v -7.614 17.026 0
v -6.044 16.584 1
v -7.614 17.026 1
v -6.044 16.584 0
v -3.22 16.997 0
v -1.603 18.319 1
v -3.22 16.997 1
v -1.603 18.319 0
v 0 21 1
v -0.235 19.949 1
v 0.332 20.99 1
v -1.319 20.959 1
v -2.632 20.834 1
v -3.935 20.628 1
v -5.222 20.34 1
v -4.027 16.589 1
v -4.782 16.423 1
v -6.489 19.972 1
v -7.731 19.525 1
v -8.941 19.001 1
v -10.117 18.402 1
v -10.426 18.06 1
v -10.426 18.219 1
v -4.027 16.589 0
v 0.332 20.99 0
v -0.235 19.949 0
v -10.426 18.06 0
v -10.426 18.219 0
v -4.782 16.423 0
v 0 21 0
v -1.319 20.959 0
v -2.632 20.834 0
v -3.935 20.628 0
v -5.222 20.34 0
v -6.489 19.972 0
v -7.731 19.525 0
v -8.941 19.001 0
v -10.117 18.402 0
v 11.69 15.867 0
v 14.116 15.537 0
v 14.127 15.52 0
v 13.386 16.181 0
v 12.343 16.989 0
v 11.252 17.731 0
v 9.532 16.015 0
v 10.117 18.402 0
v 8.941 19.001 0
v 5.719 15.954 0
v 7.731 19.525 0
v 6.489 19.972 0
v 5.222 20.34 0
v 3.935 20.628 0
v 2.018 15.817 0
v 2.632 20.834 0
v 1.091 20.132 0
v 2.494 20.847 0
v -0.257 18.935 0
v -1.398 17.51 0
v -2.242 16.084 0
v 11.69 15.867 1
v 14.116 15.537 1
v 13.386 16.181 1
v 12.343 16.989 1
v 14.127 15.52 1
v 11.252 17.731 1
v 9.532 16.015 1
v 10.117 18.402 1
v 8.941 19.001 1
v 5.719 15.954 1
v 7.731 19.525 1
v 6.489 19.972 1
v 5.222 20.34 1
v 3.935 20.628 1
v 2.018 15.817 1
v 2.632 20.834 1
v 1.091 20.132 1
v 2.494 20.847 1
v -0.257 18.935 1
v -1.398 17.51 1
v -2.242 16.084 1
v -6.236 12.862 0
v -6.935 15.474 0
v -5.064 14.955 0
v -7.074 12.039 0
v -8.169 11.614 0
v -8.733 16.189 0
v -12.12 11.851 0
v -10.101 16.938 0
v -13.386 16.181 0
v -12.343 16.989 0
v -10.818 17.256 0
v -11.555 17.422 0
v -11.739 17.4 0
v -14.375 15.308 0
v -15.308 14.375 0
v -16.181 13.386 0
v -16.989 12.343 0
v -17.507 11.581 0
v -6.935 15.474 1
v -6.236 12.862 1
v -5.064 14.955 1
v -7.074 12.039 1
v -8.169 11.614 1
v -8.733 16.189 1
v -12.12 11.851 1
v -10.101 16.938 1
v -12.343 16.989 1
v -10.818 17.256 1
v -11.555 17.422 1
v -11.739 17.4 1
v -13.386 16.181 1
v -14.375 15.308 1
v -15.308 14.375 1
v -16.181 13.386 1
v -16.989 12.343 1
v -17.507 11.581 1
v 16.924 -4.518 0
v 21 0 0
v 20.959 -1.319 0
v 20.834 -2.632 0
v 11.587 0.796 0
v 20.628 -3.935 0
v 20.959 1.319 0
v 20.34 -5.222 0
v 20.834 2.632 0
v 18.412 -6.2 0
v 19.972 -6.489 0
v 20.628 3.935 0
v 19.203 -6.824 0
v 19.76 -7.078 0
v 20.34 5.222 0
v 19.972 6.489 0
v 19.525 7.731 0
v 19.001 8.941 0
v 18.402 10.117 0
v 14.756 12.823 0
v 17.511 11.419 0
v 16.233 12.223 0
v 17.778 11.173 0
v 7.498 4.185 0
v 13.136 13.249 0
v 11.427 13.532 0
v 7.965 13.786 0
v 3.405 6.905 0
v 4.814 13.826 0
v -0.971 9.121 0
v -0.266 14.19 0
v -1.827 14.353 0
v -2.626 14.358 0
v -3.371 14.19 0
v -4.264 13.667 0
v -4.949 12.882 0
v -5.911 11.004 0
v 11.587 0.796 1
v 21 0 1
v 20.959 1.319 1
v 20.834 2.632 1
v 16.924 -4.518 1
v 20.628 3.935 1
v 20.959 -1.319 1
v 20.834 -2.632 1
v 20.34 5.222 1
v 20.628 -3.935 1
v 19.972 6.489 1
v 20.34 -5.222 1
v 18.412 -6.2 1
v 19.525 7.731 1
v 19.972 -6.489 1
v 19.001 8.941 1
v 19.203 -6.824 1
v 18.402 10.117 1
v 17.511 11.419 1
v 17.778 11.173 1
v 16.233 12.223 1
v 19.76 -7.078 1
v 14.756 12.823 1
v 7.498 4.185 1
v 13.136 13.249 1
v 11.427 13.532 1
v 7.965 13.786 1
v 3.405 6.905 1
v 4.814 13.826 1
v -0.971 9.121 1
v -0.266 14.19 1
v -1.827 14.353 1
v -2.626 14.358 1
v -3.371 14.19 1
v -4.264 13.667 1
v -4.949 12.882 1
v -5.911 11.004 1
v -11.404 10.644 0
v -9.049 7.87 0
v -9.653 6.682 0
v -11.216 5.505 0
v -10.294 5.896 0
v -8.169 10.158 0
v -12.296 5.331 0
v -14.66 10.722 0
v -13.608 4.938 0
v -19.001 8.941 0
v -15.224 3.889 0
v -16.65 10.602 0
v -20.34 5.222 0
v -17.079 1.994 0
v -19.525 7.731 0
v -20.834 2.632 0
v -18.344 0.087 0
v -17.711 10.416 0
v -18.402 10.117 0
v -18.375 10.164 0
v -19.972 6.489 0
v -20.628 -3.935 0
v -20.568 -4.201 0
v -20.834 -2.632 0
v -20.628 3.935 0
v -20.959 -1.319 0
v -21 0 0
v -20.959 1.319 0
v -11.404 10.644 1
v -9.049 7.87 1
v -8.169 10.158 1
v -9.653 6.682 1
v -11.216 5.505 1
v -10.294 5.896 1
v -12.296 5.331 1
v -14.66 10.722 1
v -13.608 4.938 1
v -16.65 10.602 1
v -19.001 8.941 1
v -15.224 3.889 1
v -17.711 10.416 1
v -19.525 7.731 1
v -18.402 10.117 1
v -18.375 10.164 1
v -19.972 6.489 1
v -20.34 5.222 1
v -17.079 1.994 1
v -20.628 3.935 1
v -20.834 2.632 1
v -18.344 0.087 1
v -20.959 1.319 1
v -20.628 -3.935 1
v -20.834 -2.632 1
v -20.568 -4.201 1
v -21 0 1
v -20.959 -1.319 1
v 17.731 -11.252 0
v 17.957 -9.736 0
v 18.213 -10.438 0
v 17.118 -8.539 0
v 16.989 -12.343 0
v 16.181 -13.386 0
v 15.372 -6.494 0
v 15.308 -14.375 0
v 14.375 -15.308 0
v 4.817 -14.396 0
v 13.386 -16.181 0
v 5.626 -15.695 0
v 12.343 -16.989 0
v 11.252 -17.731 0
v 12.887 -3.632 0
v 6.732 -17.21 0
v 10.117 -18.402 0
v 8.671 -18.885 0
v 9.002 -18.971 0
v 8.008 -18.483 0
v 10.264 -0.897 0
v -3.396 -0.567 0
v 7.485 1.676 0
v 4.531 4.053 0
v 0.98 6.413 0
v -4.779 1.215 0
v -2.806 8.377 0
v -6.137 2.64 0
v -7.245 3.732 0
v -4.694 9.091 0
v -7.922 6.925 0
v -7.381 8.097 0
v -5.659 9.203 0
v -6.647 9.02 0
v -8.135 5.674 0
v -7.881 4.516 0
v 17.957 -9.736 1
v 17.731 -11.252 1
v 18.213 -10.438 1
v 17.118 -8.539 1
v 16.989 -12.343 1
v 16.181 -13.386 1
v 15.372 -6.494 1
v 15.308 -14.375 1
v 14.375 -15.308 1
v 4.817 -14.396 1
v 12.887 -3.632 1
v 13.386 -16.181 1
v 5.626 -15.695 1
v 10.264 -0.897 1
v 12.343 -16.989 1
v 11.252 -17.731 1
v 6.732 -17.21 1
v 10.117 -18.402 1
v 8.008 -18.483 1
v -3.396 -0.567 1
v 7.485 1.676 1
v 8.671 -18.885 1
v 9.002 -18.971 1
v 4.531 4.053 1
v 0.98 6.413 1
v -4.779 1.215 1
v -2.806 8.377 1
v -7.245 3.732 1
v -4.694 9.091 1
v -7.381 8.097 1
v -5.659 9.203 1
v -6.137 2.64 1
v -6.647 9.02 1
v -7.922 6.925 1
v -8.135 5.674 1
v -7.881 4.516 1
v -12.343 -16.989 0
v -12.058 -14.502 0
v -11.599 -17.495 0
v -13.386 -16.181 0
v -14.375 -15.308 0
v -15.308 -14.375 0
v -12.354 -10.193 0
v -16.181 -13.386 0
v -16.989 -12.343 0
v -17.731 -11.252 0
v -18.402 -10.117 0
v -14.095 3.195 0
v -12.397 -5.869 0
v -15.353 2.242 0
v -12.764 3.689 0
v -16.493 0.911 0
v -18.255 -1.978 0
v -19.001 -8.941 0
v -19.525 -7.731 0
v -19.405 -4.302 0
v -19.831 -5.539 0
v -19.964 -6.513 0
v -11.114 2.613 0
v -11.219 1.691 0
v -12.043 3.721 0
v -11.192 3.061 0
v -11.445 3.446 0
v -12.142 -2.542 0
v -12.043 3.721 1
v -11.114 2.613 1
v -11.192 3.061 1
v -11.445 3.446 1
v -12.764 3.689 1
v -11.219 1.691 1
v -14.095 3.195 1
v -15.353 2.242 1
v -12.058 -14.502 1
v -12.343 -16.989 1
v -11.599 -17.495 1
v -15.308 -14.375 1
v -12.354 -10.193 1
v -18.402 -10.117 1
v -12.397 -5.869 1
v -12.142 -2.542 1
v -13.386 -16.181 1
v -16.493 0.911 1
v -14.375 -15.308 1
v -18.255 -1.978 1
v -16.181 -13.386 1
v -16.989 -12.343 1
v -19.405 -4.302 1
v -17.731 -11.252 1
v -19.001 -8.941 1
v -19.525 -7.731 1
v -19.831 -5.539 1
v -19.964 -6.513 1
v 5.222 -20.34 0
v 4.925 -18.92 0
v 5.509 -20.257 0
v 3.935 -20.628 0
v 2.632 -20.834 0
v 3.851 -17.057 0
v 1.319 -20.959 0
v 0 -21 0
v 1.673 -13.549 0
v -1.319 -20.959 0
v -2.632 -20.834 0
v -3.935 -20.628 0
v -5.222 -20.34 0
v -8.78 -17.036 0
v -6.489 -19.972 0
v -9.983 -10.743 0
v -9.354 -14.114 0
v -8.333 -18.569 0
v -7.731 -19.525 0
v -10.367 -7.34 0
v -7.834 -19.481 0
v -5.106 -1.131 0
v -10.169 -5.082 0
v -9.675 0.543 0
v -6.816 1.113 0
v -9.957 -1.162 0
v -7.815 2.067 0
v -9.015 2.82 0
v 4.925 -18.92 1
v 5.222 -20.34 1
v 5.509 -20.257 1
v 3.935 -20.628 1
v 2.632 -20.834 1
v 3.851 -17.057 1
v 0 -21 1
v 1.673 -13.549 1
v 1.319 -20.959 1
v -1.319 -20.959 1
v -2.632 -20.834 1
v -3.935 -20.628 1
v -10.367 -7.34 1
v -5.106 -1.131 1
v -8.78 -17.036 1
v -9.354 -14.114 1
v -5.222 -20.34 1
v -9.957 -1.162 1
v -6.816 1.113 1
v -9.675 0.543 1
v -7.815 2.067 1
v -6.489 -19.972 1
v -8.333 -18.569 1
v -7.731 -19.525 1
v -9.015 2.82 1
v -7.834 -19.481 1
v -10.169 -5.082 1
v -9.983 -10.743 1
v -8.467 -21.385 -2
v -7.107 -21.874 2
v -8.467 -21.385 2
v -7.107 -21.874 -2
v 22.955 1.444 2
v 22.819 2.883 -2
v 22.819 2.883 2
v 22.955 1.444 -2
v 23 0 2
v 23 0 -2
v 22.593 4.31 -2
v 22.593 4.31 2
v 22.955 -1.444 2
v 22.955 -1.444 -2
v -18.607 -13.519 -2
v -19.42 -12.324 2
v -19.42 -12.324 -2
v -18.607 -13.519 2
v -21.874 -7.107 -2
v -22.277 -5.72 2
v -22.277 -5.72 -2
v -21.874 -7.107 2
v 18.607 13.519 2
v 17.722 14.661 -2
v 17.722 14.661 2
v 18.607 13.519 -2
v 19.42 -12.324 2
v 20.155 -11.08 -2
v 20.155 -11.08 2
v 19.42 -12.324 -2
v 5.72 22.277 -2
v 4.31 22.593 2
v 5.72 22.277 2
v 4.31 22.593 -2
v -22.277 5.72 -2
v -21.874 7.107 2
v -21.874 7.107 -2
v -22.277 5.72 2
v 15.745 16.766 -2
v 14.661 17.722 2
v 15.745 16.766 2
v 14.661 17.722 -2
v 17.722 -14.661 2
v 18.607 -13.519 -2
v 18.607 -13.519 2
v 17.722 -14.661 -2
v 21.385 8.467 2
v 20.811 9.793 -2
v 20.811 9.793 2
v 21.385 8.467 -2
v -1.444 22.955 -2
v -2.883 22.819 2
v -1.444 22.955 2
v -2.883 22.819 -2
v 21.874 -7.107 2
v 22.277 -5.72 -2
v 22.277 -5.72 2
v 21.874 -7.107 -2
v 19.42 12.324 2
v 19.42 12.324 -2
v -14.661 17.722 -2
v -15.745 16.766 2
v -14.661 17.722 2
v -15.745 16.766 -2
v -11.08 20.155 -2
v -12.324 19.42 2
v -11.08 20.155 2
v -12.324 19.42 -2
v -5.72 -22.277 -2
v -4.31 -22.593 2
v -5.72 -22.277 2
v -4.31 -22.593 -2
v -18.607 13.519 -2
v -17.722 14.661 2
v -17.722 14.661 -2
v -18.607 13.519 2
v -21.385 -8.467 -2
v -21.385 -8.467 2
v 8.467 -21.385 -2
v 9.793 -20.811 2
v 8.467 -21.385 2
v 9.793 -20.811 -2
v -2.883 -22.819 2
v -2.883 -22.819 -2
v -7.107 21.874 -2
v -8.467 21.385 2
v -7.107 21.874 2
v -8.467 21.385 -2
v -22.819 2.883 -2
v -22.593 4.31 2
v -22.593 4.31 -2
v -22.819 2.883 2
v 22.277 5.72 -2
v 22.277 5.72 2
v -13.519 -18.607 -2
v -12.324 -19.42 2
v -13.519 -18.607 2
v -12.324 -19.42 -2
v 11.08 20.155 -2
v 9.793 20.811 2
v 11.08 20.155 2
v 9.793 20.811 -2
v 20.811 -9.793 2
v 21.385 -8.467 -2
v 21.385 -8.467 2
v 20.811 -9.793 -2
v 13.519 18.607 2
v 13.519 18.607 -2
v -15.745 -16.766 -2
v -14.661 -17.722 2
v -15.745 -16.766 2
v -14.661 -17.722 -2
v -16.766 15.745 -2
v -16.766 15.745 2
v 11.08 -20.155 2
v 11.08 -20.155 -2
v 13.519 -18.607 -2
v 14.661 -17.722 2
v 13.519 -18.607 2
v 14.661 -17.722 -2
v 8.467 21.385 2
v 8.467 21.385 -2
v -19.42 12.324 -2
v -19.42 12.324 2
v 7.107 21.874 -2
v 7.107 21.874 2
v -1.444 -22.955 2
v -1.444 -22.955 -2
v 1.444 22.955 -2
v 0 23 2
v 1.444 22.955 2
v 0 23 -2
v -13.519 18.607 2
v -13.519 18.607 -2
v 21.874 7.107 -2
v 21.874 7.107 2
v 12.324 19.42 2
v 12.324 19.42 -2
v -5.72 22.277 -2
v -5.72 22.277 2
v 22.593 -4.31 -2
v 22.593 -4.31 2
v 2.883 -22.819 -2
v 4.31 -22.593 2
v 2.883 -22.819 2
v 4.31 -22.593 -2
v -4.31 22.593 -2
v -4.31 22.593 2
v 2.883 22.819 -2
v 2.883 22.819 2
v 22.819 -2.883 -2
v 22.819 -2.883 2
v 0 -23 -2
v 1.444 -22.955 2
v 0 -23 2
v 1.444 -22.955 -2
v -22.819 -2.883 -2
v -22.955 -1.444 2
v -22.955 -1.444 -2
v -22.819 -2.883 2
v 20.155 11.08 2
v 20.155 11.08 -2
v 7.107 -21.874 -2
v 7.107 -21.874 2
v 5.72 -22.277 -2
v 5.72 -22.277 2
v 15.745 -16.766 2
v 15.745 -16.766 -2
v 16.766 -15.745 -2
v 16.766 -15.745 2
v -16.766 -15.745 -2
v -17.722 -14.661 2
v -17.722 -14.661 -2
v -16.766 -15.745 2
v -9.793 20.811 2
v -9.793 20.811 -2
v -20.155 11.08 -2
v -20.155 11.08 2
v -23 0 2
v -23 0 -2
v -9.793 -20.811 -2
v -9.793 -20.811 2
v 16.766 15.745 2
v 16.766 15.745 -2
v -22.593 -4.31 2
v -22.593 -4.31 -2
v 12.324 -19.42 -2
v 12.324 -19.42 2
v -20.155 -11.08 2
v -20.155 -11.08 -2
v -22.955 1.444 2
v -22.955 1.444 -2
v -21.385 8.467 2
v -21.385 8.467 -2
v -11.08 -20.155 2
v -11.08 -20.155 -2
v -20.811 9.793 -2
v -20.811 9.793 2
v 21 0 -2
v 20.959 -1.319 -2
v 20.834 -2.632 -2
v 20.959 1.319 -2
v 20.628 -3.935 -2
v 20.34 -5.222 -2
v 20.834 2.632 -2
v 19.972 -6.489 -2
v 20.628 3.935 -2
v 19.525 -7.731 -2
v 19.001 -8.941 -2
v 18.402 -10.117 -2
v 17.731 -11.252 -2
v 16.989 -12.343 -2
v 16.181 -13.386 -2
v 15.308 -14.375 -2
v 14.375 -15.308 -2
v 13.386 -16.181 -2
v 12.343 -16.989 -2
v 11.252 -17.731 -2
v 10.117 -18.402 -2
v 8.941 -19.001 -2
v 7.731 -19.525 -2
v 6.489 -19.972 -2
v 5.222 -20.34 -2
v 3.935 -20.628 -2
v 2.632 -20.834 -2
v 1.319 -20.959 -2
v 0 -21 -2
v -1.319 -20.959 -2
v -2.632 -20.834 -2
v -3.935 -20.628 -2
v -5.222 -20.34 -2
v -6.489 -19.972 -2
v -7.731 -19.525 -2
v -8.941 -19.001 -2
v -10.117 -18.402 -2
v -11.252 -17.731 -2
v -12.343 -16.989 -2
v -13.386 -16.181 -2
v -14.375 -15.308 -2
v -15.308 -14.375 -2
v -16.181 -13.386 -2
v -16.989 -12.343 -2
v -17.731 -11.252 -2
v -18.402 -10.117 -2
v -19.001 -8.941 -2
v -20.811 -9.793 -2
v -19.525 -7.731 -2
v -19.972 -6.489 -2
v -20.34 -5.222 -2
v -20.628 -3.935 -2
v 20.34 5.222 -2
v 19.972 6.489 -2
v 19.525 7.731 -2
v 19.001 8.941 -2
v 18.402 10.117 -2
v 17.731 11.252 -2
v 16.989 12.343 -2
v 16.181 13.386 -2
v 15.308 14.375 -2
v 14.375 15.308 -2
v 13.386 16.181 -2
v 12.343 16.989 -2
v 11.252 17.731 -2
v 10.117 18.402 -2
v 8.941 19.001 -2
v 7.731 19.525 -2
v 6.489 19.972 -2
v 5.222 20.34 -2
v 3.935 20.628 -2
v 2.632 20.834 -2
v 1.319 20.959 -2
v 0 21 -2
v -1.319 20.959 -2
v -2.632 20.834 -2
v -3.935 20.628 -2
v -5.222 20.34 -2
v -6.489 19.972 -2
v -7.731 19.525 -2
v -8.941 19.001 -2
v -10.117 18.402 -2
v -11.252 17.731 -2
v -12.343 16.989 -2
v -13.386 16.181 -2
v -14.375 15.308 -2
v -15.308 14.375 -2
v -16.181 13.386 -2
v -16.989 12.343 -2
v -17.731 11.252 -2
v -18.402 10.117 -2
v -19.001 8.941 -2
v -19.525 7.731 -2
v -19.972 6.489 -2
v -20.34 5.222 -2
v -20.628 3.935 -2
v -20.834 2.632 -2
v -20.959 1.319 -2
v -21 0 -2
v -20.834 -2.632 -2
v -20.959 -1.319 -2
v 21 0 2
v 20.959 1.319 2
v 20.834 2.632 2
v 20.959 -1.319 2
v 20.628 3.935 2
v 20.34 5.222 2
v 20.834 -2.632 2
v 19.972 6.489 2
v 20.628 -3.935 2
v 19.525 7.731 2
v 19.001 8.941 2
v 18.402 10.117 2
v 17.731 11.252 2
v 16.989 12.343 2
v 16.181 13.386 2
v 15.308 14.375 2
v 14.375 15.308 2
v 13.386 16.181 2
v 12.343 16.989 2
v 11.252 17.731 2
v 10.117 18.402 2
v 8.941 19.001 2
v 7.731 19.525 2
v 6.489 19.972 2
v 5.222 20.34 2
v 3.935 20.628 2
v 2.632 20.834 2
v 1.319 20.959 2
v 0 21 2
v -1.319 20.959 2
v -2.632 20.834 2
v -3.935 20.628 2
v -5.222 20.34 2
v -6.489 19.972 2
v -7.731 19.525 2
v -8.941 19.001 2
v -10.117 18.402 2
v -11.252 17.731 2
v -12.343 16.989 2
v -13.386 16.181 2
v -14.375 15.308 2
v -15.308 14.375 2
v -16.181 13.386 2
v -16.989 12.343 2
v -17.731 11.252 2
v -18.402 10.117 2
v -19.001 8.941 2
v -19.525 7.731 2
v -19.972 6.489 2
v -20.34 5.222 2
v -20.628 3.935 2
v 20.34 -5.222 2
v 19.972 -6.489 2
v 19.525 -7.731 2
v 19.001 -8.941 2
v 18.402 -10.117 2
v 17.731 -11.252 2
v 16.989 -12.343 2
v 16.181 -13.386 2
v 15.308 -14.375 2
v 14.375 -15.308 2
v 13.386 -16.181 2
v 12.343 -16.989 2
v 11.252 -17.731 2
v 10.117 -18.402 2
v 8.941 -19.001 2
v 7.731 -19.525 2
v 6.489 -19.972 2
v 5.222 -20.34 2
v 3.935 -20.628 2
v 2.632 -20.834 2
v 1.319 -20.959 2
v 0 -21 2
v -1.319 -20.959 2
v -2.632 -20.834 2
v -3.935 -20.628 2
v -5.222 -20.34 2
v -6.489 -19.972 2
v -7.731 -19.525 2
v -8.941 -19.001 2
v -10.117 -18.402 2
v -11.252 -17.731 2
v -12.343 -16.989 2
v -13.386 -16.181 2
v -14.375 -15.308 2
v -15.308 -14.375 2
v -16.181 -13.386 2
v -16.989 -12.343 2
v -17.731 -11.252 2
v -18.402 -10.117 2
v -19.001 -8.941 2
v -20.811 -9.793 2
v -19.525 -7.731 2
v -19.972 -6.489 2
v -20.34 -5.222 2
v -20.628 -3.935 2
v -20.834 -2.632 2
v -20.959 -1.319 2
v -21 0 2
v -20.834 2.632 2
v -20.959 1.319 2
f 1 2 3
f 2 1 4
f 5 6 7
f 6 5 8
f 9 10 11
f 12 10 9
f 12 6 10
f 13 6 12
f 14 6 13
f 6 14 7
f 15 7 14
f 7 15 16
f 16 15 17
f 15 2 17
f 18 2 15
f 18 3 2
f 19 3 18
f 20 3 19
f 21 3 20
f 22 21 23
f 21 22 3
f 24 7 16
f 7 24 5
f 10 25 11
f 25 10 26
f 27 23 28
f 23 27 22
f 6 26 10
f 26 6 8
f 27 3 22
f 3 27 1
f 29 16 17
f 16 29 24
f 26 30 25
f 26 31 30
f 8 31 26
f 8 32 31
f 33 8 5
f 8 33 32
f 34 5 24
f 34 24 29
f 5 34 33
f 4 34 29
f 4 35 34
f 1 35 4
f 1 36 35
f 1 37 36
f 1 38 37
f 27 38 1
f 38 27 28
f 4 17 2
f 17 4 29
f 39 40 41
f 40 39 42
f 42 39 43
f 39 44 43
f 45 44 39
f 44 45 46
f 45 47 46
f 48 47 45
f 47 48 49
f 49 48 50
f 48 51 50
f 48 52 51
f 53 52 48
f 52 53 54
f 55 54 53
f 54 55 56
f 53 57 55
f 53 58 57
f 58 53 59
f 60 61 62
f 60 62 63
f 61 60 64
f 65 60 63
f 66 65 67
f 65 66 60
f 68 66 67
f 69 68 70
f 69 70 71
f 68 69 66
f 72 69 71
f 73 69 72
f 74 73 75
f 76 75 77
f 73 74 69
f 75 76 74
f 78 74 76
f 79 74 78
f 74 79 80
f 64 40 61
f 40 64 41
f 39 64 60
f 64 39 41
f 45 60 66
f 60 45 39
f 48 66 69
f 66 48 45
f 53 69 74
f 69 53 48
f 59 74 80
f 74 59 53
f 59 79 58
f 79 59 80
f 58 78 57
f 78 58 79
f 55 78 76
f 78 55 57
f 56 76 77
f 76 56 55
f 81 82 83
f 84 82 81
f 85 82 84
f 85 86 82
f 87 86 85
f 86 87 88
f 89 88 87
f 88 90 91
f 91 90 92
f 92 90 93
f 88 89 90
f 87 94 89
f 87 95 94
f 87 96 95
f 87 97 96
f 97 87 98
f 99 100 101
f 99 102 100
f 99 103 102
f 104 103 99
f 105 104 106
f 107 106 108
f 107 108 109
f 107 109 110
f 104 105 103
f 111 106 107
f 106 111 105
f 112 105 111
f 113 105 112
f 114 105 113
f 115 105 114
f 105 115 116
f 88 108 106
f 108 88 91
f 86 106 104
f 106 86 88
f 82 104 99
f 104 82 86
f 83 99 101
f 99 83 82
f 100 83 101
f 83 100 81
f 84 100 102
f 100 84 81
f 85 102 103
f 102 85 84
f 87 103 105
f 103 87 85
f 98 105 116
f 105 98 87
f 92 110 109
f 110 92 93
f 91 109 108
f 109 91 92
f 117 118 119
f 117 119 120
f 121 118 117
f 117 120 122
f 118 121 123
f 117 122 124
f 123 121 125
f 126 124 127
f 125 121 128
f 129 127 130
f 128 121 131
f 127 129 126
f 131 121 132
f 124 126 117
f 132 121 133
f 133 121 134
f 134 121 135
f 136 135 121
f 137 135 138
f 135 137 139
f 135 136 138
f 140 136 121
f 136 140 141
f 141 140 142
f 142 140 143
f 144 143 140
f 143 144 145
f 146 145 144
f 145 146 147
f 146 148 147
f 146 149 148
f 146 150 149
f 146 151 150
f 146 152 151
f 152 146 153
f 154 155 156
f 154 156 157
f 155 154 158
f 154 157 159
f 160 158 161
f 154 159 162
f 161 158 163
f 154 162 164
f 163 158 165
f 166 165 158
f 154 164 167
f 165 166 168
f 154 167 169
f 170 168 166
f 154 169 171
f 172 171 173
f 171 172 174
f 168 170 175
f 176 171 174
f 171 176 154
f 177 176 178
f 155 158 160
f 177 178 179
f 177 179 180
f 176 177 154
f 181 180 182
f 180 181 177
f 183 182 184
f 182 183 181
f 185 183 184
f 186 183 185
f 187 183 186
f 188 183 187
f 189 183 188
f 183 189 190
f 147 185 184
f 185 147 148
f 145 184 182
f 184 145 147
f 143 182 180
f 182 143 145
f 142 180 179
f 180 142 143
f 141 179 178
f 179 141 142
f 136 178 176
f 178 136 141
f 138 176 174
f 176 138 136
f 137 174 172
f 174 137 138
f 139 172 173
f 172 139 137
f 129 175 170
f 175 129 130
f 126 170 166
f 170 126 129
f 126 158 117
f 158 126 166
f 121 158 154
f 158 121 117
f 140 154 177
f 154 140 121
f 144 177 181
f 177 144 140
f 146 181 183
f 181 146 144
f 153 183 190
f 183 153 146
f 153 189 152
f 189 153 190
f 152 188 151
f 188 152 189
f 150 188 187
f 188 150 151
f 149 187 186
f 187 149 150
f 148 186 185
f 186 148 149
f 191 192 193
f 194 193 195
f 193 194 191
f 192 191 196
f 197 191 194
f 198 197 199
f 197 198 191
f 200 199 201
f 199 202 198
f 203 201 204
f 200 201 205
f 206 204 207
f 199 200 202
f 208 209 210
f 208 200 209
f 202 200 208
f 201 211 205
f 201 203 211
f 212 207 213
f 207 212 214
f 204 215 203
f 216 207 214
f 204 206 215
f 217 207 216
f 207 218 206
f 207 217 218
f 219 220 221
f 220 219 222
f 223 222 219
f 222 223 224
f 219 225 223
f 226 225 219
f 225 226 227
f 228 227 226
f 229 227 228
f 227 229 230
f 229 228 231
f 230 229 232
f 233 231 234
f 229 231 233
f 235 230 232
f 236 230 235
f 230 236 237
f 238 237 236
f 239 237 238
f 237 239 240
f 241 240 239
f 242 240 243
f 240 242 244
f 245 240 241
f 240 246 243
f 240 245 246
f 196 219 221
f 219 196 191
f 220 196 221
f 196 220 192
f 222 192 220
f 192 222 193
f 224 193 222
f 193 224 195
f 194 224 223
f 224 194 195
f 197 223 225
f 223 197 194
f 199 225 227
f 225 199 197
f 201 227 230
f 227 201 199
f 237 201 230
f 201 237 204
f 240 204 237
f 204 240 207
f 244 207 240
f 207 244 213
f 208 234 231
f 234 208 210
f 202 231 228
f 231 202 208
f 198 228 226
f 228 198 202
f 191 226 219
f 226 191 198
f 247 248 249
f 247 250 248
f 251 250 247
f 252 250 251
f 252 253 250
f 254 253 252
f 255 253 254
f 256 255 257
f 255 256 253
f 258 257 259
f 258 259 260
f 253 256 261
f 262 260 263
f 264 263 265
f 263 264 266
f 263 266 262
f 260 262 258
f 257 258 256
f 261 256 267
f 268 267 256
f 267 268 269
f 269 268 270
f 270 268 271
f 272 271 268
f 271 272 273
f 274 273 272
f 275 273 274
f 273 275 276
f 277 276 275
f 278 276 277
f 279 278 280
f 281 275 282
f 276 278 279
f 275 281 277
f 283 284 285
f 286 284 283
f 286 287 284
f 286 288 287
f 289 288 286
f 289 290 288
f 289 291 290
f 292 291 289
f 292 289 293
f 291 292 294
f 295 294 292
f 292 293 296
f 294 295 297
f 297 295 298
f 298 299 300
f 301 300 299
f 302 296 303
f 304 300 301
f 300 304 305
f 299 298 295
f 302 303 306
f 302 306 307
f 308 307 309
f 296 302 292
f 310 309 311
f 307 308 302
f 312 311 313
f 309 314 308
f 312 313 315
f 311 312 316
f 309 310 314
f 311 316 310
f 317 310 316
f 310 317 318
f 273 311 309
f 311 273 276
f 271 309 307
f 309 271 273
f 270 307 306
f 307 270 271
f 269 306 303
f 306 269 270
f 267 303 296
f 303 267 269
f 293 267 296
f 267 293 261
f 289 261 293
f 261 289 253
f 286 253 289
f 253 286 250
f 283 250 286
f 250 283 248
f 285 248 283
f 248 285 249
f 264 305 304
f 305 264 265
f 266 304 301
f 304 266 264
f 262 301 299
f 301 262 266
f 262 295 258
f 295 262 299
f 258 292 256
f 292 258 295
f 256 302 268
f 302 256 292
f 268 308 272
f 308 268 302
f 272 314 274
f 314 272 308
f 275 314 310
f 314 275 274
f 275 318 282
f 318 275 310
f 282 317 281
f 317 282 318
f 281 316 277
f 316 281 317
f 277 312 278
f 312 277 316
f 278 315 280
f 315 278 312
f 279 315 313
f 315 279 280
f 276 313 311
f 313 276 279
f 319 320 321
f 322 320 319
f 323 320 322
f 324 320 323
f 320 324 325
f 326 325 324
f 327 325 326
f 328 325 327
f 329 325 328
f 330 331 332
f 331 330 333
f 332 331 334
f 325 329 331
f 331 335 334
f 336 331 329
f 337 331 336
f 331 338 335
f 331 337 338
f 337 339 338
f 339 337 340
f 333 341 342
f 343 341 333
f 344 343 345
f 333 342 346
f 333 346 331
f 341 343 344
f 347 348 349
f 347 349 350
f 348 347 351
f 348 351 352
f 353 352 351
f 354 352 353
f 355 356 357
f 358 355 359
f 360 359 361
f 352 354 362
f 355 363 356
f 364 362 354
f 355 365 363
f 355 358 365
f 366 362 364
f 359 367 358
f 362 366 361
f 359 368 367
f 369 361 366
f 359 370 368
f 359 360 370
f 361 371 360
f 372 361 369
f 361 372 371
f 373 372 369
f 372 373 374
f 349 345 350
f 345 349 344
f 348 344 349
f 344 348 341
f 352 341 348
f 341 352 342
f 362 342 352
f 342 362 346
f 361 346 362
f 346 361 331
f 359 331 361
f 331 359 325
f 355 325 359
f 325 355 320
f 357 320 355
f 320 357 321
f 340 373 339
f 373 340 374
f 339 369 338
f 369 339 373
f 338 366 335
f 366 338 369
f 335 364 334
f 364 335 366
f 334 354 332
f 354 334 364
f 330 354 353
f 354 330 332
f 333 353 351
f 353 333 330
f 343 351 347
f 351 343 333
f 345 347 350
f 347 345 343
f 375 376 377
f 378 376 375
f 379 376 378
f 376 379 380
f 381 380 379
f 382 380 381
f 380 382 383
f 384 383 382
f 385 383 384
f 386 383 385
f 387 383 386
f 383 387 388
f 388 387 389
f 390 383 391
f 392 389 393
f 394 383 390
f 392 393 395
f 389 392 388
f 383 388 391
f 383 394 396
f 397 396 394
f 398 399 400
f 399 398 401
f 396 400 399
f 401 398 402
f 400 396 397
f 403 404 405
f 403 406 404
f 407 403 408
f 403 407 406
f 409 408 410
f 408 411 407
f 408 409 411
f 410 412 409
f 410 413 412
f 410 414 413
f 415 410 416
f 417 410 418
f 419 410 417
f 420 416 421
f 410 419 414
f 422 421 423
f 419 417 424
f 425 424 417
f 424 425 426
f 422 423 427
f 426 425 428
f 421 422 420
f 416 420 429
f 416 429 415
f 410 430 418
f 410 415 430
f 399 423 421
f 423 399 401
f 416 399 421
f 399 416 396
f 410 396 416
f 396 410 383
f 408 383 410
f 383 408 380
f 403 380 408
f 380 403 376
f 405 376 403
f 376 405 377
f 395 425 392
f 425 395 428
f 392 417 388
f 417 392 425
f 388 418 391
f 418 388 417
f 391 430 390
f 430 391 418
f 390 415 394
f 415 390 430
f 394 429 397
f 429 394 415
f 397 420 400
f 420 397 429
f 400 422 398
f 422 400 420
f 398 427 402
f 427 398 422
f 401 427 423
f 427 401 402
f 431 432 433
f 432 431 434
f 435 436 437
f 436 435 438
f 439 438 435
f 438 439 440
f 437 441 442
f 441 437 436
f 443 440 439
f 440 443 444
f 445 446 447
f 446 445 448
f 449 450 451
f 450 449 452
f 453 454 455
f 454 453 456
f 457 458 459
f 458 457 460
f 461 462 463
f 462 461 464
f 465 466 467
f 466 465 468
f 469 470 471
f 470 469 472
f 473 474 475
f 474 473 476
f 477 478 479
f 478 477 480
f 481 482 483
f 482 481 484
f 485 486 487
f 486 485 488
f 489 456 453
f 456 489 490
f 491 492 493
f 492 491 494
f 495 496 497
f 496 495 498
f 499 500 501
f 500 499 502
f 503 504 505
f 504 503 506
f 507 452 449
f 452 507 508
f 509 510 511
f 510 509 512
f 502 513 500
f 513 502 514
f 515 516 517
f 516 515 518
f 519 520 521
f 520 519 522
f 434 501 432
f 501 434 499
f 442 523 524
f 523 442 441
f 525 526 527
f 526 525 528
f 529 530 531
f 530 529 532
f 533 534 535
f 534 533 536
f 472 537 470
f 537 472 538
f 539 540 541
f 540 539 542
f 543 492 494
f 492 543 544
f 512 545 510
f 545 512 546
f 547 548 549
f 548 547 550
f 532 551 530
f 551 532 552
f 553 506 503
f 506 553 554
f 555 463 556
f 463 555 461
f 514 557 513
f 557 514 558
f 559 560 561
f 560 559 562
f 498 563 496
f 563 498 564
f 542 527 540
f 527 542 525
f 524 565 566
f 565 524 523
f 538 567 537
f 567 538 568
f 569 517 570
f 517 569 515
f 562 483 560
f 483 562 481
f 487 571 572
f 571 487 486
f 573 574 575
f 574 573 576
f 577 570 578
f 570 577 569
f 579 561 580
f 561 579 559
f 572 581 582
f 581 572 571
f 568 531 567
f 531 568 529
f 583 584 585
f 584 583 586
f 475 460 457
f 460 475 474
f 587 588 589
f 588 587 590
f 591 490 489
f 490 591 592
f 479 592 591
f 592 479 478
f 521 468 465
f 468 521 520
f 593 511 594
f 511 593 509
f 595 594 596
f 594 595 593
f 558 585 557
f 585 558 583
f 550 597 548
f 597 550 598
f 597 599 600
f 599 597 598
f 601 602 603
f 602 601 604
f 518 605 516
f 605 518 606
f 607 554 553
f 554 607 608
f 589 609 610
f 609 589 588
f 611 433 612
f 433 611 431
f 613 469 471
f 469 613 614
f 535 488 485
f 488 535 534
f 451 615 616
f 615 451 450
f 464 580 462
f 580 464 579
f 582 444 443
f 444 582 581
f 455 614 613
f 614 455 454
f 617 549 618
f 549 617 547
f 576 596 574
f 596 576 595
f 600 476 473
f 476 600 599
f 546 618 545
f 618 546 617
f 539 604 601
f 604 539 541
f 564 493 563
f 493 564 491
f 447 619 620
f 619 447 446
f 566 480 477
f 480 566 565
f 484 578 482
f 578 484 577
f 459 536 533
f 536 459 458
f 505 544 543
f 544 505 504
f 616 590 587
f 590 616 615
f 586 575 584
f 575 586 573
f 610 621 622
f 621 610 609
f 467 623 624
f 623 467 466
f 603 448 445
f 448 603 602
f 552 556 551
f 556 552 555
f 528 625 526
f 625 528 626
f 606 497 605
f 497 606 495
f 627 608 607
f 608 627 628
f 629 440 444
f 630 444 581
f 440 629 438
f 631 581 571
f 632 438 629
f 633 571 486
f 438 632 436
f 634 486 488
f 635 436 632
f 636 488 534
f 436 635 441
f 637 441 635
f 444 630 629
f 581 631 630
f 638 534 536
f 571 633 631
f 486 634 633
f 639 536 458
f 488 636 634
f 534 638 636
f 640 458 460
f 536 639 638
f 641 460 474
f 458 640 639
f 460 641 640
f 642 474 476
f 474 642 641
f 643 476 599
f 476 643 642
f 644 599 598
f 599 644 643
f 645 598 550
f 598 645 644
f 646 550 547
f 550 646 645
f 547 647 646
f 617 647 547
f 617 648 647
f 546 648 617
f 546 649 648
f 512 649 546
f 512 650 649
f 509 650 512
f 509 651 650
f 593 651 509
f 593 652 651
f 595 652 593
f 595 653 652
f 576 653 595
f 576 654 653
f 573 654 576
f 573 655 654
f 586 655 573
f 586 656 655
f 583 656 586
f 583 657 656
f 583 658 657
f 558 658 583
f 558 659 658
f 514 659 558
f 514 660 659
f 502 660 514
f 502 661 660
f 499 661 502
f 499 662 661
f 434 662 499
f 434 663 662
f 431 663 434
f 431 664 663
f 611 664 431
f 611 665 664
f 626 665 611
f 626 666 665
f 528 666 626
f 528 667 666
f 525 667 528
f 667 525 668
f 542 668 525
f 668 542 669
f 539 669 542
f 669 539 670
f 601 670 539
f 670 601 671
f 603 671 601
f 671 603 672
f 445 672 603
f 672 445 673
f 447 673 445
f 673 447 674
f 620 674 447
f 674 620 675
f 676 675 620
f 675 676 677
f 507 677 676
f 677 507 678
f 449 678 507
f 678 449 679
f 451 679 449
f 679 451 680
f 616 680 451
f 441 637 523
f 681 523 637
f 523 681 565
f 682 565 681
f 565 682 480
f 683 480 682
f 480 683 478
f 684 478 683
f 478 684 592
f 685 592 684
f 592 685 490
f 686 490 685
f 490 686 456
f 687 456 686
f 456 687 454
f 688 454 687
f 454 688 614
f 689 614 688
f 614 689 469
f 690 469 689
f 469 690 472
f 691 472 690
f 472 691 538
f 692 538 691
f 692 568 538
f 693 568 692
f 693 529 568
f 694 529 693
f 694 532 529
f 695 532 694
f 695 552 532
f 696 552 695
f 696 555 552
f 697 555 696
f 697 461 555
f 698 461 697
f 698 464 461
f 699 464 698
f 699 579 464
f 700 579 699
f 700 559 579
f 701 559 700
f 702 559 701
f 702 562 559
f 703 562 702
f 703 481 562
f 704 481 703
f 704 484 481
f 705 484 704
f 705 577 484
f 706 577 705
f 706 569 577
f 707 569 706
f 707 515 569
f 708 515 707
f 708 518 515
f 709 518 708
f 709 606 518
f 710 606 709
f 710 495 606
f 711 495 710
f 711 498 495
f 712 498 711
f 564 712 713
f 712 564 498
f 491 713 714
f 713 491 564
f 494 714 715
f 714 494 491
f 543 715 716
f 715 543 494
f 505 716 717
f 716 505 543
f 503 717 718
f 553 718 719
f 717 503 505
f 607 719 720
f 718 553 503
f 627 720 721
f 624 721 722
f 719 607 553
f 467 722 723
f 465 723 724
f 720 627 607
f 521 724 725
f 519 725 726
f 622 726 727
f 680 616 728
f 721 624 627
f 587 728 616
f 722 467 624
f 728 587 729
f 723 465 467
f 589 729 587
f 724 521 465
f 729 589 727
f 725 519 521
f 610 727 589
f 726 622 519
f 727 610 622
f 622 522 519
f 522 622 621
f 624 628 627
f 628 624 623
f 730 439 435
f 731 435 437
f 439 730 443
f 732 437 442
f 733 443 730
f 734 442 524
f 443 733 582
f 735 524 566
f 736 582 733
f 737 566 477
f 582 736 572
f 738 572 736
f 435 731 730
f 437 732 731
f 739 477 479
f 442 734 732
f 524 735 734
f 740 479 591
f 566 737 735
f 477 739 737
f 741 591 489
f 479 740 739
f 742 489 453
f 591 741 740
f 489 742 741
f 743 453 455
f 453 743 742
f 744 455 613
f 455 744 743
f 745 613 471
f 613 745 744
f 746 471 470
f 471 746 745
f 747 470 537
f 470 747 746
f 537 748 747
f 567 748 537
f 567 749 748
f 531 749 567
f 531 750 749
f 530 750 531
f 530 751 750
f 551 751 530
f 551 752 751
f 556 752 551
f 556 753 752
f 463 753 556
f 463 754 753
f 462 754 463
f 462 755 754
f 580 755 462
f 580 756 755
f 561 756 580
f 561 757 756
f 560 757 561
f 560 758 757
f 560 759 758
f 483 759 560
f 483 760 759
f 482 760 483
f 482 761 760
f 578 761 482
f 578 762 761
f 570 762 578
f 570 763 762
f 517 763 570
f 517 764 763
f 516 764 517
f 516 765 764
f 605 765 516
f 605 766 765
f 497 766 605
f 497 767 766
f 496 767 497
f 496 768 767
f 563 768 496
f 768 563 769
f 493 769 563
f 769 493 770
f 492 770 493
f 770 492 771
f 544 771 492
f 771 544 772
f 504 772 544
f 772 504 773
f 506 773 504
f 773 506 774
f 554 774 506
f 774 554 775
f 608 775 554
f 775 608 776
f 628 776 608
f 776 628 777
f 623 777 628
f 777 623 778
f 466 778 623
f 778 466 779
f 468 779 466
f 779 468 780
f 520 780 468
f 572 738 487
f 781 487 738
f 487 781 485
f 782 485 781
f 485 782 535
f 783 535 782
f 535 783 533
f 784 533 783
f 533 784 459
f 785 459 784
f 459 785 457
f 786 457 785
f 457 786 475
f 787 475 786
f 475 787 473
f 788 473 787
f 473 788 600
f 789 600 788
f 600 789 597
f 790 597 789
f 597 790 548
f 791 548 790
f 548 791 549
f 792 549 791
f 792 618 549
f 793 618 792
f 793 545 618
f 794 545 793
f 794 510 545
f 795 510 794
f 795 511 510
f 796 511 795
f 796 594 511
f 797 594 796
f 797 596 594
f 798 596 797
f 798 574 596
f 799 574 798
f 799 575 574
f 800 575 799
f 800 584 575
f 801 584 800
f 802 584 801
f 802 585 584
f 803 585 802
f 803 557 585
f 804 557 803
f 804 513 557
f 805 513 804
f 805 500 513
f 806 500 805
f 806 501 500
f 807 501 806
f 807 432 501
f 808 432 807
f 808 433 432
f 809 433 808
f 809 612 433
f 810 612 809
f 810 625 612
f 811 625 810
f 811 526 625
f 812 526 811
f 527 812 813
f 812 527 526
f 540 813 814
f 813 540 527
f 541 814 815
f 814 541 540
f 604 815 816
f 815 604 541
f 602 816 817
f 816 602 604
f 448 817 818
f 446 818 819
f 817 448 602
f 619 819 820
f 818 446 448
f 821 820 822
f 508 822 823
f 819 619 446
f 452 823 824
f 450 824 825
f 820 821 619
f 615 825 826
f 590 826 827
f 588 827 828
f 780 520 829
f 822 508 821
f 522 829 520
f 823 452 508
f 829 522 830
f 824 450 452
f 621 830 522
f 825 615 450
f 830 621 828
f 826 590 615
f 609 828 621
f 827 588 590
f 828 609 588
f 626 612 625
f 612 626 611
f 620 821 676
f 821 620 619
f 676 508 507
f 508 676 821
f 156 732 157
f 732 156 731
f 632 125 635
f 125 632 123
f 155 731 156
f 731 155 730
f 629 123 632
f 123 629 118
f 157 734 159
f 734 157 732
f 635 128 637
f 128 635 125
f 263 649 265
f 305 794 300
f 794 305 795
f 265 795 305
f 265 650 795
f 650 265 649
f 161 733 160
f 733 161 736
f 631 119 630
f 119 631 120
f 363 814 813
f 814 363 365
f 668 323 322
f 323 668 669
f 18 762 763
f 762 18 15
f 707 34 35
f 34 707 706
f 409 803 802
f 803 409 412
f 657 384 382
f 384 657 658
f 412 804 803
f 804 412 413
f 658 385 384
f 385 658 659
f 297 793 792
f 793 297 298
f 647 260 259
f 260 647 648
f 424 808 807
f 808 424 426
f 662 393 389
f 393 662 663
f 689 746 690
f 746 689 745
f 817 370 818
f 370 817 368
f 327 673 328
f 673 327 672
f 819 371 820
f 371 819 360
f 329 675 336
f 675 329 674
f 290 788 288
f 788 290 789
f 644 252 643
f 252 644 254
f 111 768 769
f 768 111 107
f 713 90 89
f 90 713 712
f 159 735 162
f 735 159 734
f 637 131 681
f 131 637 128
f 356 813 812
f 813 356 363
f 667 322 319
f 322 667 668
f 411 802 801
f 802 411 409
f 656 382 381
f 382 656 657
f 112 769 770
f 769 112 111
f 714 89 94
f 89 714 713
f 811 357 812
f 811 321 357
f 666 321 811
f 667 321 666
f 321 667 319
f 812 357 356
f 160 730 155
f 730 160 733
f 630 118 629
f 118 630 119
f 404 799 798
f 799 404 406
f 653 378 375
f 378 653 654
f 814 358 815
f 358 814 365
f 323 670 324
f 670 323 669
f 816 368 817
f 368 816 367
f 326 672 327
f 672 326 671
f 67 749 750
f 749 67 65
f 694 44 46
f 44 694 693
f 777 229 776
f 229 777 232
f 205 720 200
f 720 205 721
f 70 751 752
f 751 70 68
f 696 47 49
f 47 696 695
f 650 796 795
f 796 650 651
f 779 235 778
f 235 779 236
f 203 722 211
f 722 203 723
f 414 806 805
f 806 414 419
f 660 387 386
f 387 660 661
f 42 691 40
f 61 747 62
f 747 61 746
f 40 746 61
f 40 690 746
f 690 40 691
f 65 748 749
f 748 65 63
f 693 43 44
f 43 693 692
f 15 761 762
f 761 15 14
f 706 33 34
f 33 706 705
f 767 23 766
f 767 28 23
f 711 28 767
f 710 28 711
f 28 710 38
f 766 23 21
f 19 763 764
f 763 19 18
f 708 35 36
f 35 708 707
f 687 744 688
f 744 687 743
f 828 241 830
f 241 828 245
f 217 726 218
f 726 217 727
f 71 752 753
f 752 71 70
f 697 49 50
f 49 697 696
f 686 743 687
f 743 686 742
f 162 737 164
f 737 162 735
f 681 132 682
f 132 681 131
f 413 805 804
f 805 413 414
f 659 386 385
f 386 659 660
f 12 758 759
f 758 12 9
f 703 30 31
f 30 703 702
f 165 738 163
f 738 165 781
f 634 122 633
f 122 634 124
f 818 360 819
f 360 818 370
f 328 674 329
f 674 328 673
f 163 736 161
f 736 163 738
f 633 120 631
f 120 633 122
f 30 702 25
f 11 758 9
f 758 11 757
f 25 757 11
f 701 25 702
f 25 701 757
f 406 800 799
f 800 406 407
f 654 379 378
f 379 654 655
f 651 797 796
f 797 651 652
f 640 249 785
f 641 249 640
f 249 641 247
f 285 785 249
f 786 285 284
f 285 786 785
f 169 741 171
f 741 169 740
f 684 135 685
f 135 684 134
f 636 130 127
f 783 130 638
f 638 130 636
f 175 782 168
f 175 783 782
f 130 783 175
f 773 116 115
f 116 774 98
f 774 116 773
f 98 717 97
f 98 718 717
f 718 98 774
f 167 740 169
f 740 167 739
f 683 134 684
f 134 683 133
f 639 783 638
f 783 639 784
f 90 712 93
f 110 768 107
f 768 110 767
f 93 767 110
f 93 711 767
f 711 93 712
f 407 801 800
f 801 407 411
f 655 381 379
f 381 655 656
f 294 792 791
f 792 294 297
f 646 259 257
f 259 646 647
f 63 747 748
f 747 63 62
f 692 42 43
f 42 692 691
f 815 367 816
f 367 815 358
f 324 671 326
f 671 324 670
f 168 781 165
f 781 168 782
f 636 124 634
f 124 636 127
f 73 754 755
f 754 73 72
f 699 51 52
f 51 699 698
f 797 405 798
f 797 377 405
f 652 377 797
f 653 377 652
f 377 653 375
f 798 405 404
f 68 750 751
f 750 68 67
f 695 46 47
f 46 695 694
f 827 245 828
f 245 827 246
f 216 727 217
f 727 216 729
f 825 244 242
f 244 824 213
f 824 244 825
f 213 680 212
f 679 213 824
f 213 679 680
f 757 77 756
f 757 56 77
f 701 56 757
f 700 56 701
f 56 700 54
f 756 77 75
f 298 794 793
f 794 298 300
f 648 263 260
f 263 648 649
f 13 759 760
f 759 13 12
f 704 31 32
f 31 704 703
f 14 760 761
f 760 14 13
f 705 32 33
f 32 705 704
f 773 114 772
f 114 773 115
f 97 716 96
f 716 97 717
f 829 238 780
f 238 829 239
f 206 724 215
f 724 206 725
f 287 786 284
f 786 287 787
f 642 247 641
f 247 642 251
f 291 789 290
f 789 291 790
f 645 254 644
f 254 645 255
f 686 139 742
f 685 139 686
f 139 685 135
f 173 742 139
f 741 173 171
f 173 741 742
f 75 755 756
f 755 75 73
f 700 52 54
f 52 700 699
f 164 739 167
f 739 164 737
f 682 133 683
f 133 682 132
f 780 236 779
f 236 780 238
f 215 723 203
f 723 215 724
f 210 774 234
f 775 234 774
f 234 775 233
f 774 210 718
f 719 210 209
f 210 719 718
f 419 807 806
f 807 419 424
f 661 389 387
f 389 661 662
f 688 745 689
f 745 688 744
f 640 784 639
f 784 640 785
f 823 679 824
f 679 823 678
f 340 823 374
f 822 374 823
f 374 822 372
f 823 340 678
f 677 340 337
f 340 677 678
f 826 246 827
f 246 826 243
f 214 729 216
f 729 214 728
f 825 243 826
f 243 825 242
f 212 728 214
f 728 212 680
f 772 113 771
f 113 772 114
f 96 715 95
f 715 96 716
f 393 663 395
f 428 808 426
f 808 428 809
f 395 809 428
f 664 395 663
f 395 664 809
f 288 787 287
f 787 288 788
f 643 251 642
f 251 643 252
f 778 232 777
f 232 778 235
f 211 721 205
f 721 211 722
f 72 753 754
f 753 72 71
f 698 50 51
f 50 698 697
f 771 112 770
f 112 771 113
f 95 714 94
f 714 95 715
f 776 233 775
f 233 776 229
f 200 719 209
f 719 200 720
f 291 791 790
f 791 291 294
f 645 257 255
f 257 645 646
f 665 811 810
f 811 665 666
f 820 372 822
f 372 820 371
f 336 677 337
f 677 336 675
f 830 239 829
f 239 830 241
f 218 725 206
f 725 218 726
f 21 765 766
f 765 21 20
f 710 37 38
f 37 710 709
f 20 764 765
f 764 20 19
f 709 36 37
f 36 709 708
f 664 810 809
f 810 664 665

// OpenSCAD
// Module names are of the form poly_<inkscape-path-id>().  As a result,
// you can associate a polygon in this OpenSCAD program with the corresponding
// SVG element in the Inkscape document by looking for the XML element with
// the attribute id="inkscape-path-id".

// fudge value is used to ensure that subtracted solids are a tad taller
// in the z dimension than the polygon being subtracted from.  This helps
// keep the resulting .stl file manifold.
fudge = 0.1;

module poly_innerballSelection(h)
{
  scale([25.4/90, -25.4/90, 1]) union()
  {
    linear_extrude(height=h)
      polygon([[2.056387,-75.991250],[-0.833613,-70.684375],[-5.681113,-64.908750],[-11.409863,-60.224375],[-14.268379,-58.778906],[-16.943613,-58.191250],[-21.417207,-58.761406],[-26.977363,-60.330000],[-36.943613,-63.991250],[-36.943613,-66.991250],[-27.065645,-70.951250],[-17.987363,-73.726250],[-8.637207,-75.383750],[2.056387,-75.991250]]);
    linear_extrude(height=h)
      polygon([[9.056387,-73.981250],[12.045137,-74.477969],[15.078887,-74.347500],[21.056387,-73.101250],[29.101855,-70.565469],[37.555137,-66.682500],[45.009043,-61.481406],[47.921484,-58.395645],[50.056387,-54.991250],[41.421289,-56.221523],[33.775605,-56.746562],[20.265137,-56.531250],[7.150293,-56.045937],[-7.943613,-56.991250],[-4.954082,-62.045000],[-0.909863,-67.091250],[3.867480,-71.335000],[9.056387,-73.981250]]);
    linear_extrude(height=h)
      polygon([[-40.943613,-61.731250],[-38.330645,-61.142656],[-35.789863,-60.015000],[-30.943613,-57.361250],[-24.571113,-54.827500],[-17.943613,-52.991250],[-22.097363,-45.575000],[-25.066270,-42.656719],[-28.943613,-41.151250],[-42.943613,-41.991250],[-62.943613,-40.991250],[-59.438613,-47.356562],[-54.096113,-54.316250],[-50.973691,-57.371523],[-47.677363,-59.798437],[-44.302285,-61.338008],[-40.943613,-61.731250]]);
    linear_extrude(height=h)
      polygon([[-11.943613,-50.281250],[-9.305176,-50.874687],[-6.473613,-50.858750],[-0.943613,-50.281250],[17.056387,-48.991250],[28.223262,-48.849531],[40.488887,-47.947500],[46.543887,-46.945645],[52.285762,-45.434844],[57.518574,-43.308809],[62.046387,-40.461250],[65.088638,-37.658560],[67.701895,-34.440352],[71.732949,-26.959062],[74.322598,-18.420742],[75.653887,-9.228750],[75.909863,0.213555],[75.273574,9.502813],[73.928066,18.235664],[72.056387,26.008750],[68.041074,24.179063],[65.238887,21.968750],[59.966387,16.008750],[41.056387,-2.821250],[26.567949,-14.830469],[12.066387,-24.465000],[-3.440176,-32.320156],[-20.943613,-38.991250],[-17.534863,-45.645000],[-15.109082,-48.425781],[-11.943613,-50.281250]]);
    linear_extrude(height=h)
      polygon([[-72.193613,-23.991250],[-69.698613,-30.487500],[-67.859551,-33.617031],[-65.613613,-35.821250],[-62.754863,-36.908437],[-58.996113,-37.566250],[-51.943613,-37.991250],[-40.406113,-37.715000],[-28.943613,-35.991250],[-32.063613,-27.886250],[-34.202988,-23.678125],[-36.473613,-20.891250],[-39.741895,-19.504687],[-43.569863,-18.888750],[-48.217207,-17.496562],[-53.943613,-13.781250],[-60.516582,-7.063750],[-64.999863,-0.308750],[-72.943613,15.008750],[-74.706641,11.202207],[-75.713457,6.559531],[-75.909863,-4.172500],[-74.435645,-15.063906],[-72.193613,-23.991250]]);
    linear_extrude(height=h)
      polygon([[-9.943613,-29.681250],[3.472637,-22.722500],[16.056387,-14.361250],[26.519980,-5.938906],[36.367637,3.180000],[45.662168,12.870781],[54.466387,23.008750],[60.653887,30.257500],[63.626699,34.496406],[64.906387,38.008750],[64.374043,40.513438],[63.025137,43.286250],[59.726387,48.008750],[50.175137,57.788750],[44.624668,62.214687],[39.056387,65.678750],[36.157637,66.988750],[33.056387,67.518750],[30.723770,66.915977],[28.375449,65.490313],[23.853887,60.981250],[19.936074,55.613438],[17.066387,51.008750],[-12.033613,2.008750],[-16.933770,-4.305469],[-21.744863,-9.355000],[-25.672832,-13.225156],[-27.923613,-16.001250],[-28.824238,-20.103750],[-28.071113,-24.536250],[-26.151738,-28.691250],[-23.553613,-31.961250],[-20.050332,-32.610469],[-16.632363,-32.212500],[-9.943613,-29.681250]]);
    linear_extrude(height=h)
      polygon([[-65.933613,38.008750],[-69.358613,31.320000],[-70.453301,27.781094],[-70.863613,24.008750],[-70.266426,19.627031],[-68.756113,15.242500],[-64.683613,7.008750],[-58.438613,-3.228750],[-54.401113,-7.942500],[-49.943613,-11.321250],[-45.226113,-13.071250],[-42.673301,-13.183125],[-40.553613,-12.211250],[-39.657988,-10.845625],[-39.381113,-9.258750],[-39.753613,-5.991250],[-43.023613,9.008750],[-43.926270,20.794531],[-43.772363,36.117500],[-42.724082,51.386094],[-40.943613,63.008750],[-44.808105,61.351289],[-48.515801,58.987187],[-55.351113,52.713750],[-61.230176,45.337813],[-65.933613,38.008750]]);
    linear_extrude(height=h)
      polygon([[-18.093613,4.008750],[5.926387,48.008750],[13.643887,60.437500],[17.449199,67.039531],[20.056387,73.008750],[11.683730,75.159063],[2.702637,75.991250],[-6.351582,75.717188],[-14.943613,74.548750],[-21.619863,72.905000],[-24.890020,71.515469],[-27.433613,69.618750],[-29.525332,65.793906],[-31.109863,60.365000],[-33.143613,50.008750],[-35.373613,38.065000],[-36.733613,26.008750],[-36.033613,18.008750],[-35.282363,4.117500],[-34.282832,-1.924844],[-31.943613,-9.991250],[-27.691270,-7.325625],[-24.152363,-3.943750],[-18.093613,4.008750]]);
  }
}

module basketballb(h)
{

poly_innerballSelection(h);
}



basketballb(1);


difference()
{
	cylinder (h = 4, r=23, center = true, $fn=100);

	cylinder (h = 4.20, r=21, center = true, $fn=100);
}
